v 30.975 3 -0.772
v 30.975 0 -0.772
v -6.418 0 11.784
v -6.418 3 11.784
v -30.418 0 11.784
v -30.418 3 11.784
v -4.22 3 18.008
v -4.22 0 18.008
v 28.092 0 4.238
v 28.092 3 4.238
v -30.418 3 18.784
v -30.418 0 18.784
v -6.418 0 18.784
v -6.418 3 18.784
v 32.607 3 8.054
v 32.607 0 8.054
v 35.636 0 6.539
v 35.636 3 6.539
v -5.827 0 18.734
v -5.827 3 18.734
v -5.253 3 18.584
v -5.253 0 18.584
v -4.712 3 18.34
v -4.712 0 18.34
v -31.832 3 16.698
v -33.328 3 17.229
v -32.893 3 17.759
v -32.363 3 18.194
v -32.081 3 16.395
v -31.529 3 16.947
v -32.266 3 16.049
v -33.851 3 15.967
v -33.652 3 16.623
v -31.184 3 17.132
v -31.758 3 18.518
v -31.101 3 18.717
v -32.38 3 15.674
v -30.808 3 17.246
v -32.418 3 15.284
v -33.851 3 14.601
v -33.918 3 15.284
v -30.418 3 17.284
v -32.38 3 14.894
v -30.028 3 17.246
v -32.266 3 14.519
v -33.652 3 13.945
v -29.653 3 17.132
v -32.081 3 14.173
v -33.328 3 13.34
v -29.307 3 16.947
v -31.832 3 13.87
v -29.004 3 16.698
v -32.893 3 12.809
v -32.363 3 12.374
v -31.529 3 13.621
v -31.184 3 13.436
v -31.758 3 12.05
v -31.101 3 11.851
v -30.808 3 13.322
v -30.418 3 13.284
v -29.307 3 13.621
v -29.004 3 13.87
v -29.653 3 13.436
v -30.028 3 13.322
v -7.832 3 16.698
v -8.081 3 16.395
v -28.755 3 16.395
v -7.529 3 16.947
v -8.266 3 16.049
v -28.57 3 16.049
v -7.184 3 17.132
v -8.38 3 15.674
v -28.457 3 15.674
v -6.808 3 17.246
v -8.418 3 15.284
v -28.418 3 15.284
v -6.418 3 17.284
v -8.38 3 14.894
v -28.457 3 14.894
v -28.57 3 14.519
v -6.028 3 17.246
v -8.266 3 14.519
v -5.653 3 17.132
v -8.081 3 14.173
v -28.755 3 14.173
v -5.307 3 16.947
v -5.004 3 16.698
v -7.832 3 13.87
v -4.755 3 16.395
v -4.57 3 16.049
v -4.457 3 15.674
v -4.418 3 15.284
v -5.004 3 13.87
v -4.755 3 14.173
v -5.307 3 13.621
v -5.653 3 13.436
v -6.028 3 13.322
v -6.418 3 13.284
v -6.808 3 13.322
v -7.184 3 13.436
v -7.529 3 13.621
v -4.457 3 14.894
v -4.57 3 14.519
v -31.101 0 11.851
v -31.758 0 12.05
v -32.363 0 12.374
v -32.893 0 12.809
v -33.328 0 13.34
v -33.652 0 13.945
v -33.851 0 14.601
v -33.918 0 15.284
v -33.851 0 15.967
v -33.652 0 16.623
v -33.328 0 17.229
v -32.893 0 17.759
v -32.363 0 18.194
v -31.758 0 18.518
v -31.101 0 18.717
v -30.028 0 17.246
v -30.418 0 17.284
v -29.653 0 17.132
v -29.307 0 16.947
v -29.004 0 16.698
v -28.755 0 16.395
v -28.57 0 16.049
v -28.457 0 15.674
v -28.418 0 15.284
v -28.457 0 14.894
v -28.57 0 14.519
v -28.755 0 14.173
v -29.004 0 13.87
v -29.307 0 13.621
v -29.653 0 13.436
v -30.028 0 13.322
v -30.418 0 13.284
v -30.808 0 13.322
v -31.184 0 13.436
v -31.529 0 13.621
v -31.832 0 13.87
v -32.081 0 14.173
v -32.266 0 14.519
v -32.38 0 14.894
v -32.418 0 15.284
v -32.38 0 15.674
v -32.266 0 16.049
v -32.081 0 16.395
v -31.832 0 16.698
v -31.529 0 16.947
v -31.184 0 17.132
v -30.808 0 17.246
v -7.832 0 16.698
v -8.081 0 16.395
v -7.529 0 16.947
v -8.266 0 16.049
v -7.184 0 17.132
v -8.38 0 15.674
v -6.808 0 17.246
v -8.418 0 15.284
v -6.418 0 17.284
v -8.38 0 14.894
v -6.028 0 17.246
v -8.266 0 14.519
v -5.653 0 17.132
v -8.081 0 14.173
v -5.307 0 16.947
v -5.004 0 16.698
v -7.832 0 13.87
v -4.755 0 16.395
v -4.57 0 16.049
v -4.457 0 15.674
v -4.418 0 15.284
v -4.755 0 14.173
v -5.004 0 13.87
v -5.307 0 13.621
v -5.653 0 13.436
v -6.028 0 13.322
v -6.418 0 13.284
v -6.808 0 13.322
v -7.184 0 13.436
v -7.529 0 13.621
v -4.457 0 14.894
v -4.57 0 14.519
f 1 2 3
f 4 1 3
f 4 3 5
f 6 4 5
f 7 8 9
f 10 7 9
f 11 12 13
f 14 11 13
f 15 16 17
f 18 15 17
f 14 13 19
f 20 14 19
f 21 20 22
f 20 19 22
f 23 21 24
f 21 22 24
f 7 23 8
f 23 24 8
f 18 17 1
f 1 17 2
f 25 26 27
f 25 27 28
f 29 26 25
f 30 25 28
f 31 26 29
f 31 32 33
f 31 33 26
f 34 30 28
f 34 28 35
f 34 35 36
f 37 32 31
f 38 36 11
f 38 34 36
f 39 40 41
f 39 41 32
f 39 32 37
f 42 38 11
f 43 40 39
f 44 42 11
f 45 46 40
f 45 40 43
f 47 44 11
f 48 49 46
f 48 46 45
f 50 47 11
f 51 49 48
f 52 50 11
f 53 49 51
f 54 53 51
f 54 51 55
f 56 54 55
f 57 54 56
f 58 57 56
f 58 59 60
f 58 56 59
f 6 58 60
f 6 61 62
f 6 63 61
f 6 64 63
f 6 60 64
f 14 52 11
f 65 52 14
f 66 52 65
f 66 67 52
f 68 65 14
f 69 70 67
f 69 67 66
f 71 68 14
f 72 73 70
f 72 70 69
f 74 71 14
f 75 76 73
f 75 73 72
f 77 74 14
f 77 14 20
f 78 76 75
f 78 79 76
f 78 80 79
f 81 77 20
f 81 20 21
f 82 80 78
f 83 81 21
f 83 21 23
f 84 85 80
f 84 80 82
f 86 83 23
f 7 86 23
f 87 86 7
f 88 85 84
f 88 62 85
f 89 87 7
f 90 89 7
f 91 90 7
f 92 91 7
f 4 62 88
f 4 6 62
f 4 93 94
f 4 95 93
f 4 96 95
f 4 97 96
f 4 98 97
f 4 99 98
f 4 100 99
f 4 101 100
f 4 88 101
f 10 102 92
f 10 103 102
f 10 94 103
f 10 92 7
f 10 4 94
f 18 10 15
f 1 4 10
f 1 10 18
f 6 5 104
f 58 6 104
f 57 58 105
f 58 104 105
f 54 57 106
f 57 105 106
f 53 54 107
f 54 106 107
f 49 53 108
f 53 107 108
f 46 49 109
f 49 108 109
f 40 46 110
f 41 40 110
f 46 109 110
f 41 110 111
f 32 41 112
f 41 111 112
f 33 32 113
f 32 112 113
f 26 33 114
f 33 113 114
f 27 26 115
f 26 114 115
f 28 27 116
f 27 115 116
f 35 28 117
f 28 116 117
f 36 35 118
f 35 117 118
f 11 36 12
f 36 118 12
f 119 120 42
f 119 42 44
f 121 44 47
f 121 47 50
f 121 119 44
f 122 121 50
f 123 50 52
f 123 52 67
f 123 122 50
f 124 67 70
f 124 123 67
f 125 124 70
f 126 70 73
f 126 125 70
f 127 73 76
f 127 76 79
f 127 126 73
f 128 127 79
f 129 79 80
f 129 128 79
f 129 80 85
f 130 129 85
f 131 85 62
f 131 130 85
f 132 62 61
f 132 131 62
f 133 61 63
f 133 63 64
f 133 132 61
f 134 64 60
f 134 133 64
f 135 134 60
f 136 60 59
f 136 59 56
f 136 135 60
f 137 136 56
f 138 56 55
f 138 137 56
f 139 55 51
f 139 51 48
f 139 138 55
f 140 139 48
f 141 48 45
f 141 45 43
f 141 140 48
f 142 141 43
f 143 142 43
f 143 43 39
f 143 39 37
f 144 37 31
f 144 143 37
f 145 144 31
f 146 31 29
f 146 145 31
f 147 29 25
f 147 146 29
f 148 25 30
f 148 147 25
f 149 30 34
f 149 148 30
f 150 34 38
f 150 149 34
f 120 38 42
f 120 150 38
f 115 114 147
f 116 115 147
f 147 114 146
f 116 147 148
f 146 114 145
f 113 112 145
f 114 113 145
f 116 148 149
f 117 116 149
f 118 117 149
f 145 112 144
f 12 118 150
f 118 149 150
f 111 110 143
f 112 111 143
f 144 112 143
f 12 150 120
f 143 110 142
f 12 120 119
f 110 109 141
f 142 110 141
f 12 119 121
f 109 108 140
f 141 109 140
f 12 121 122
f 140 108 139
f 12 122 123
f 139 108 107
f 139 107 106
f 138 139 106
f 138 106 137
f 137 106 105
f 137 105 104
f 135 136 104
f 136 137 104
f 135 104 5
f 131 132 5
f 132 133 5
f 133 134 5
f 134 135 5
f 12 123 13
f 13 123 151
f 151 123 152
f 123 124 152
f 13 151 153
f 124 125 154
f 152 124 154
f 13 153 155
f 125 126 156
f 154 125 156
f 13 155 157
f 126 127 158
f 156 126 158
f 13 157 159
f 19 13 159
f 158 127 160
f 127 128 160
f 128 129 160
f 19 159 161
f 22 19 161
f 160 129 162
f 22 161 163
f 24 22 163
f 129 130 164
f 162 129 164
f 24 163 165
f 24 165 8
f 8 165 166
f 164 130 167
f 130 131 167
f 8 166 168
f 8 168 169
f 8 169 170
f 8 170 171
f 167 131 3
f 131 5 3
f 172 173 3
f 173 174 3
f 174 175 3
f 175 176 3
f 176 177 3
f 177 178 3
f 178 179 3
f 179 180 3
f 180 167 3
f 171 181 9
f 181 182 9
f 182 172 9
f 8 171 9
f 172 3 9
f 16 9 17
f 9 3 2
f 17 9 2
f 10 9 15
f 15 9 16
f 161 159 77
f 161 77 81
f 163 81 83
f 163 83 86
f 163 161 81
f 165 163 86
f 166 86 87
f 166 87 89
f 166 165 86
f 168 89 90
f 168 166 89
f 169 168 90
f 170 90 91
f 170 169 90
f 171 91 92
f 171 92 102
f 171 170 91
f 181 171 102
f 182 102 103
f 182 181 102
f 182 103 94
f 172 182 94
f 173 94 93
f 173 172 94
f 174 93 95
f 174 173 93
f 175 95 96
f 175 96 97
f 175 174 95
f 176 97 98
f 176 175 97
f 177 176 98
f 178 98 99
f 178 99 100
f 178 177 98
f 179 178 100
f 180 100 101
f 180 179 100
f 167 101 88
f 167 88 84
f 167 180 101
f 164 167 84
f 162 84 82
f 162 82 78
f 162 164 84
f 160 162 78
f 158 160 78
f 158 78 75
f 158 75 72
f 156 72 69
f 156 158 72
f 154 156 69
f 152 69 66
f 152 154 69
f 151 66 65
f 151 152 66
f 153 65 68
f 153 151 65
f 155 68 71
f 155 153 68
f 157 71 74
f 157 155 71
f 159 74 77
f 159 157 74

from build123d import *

# Parameters (mm, degrees)
SKETCH_1_R      = 3.5
SKETCH_1_R_2    = 2
EXTRUDE_2_DEPTH = 3


with BuildPart() as part:
    # ｽｹｯﾁ1 → ﾎﾞｽ - 押し出し2 (new body)
    # profile 1 of 4: a face of its own
    with BuildSketch(Plane(origin=(0, 0, 0), x_dir=(1, 0, 0), z_dir=(0, 1, 0))):
        with BuildLine():
            Line((-30.418207164, -18.784024388), (-6.418207164, -18.784024388))
            ThreePointArc((-6.418207164, -18.784024388), (-9.918207164, -15.284024388), (-6.418207164, -11.784024388))
            Line((-6.418207164, -11.784024388), (-30.418207164, -11.784024388))
            ThreePointArc((-30.418207164, -11.784024388), (-27.94333343, -12.809150654), (-26.918207164, -15.284024388))
            ThreePointArc((-26.918207164, -15.284024388), (-27.94333343, -17.758898122), (-30.418207164, -18.784024388))
        make_face()
    # profile 2 of 4: a face of its own
    with BuildSketch(Plane(origin=(0, 0, 0), x_dir=(1, 0, 0), z_dir=(0, 1, 0))):
        with Locations((-30.418207164, -15.284024388)):
            Circle(SKETCH_1_R)
        with Locations(Location((-30.418207164, -15.284024388, 0), (0, 0, 270))):
            Circle(SKETCH_1_R_2, mode=Mode.SUBTRACT)
    # profile 3 of 4: a face of its own
    with BuildSketch(Plane(origin=(0, 0, 0), x_dir=(1, 0, 0), z_dir=(0, 1, 0))):
        with Locations((-6.418207164, -15.284024388)):
            Circle(SKETCH_1_R)
        with Locations(Location((-6.418207164, -15.284024388, 0), (0, 0, 270))):
            Circle(SKETCH_1_R_2, mode=Mode.SUBTRACT)
    # profile 4 of 4: a face of its own
    with BuildSketch(Plane(origin=(0, 0, 0), x_dir=(1, 0, 0), z_dir=(0, 1, 0))):
        with BuildLine():
            ThreePointArc((-2.918207164, -15.284024388), (-3.260445919, -16.793509042), (-4.220232261, -18.007791325))
            Line((-4.220232261, -18.007791325), (28.091680373, -4.237751216))
            Line((28.091680373, -4.237751216), (32.606722729, -8.053690239))
            Line((32.606722729, -8.053690239), (35.636170503, -6.538966352))
            Line((35.636170503, -6.538966352), (30.97548162, 0.772489334))
            Line((30.97548162, 0.772489334), (-6.418207164, -11.784024388))
            ThreePointArc((-6.418207164, -11.784024388), (-3.94333343, -12.809150654), (-2.918207164, -15.284024388))
        make_face()
    extrude(amount=EXTRUDE_2_DEPTH)


solid = part.part
